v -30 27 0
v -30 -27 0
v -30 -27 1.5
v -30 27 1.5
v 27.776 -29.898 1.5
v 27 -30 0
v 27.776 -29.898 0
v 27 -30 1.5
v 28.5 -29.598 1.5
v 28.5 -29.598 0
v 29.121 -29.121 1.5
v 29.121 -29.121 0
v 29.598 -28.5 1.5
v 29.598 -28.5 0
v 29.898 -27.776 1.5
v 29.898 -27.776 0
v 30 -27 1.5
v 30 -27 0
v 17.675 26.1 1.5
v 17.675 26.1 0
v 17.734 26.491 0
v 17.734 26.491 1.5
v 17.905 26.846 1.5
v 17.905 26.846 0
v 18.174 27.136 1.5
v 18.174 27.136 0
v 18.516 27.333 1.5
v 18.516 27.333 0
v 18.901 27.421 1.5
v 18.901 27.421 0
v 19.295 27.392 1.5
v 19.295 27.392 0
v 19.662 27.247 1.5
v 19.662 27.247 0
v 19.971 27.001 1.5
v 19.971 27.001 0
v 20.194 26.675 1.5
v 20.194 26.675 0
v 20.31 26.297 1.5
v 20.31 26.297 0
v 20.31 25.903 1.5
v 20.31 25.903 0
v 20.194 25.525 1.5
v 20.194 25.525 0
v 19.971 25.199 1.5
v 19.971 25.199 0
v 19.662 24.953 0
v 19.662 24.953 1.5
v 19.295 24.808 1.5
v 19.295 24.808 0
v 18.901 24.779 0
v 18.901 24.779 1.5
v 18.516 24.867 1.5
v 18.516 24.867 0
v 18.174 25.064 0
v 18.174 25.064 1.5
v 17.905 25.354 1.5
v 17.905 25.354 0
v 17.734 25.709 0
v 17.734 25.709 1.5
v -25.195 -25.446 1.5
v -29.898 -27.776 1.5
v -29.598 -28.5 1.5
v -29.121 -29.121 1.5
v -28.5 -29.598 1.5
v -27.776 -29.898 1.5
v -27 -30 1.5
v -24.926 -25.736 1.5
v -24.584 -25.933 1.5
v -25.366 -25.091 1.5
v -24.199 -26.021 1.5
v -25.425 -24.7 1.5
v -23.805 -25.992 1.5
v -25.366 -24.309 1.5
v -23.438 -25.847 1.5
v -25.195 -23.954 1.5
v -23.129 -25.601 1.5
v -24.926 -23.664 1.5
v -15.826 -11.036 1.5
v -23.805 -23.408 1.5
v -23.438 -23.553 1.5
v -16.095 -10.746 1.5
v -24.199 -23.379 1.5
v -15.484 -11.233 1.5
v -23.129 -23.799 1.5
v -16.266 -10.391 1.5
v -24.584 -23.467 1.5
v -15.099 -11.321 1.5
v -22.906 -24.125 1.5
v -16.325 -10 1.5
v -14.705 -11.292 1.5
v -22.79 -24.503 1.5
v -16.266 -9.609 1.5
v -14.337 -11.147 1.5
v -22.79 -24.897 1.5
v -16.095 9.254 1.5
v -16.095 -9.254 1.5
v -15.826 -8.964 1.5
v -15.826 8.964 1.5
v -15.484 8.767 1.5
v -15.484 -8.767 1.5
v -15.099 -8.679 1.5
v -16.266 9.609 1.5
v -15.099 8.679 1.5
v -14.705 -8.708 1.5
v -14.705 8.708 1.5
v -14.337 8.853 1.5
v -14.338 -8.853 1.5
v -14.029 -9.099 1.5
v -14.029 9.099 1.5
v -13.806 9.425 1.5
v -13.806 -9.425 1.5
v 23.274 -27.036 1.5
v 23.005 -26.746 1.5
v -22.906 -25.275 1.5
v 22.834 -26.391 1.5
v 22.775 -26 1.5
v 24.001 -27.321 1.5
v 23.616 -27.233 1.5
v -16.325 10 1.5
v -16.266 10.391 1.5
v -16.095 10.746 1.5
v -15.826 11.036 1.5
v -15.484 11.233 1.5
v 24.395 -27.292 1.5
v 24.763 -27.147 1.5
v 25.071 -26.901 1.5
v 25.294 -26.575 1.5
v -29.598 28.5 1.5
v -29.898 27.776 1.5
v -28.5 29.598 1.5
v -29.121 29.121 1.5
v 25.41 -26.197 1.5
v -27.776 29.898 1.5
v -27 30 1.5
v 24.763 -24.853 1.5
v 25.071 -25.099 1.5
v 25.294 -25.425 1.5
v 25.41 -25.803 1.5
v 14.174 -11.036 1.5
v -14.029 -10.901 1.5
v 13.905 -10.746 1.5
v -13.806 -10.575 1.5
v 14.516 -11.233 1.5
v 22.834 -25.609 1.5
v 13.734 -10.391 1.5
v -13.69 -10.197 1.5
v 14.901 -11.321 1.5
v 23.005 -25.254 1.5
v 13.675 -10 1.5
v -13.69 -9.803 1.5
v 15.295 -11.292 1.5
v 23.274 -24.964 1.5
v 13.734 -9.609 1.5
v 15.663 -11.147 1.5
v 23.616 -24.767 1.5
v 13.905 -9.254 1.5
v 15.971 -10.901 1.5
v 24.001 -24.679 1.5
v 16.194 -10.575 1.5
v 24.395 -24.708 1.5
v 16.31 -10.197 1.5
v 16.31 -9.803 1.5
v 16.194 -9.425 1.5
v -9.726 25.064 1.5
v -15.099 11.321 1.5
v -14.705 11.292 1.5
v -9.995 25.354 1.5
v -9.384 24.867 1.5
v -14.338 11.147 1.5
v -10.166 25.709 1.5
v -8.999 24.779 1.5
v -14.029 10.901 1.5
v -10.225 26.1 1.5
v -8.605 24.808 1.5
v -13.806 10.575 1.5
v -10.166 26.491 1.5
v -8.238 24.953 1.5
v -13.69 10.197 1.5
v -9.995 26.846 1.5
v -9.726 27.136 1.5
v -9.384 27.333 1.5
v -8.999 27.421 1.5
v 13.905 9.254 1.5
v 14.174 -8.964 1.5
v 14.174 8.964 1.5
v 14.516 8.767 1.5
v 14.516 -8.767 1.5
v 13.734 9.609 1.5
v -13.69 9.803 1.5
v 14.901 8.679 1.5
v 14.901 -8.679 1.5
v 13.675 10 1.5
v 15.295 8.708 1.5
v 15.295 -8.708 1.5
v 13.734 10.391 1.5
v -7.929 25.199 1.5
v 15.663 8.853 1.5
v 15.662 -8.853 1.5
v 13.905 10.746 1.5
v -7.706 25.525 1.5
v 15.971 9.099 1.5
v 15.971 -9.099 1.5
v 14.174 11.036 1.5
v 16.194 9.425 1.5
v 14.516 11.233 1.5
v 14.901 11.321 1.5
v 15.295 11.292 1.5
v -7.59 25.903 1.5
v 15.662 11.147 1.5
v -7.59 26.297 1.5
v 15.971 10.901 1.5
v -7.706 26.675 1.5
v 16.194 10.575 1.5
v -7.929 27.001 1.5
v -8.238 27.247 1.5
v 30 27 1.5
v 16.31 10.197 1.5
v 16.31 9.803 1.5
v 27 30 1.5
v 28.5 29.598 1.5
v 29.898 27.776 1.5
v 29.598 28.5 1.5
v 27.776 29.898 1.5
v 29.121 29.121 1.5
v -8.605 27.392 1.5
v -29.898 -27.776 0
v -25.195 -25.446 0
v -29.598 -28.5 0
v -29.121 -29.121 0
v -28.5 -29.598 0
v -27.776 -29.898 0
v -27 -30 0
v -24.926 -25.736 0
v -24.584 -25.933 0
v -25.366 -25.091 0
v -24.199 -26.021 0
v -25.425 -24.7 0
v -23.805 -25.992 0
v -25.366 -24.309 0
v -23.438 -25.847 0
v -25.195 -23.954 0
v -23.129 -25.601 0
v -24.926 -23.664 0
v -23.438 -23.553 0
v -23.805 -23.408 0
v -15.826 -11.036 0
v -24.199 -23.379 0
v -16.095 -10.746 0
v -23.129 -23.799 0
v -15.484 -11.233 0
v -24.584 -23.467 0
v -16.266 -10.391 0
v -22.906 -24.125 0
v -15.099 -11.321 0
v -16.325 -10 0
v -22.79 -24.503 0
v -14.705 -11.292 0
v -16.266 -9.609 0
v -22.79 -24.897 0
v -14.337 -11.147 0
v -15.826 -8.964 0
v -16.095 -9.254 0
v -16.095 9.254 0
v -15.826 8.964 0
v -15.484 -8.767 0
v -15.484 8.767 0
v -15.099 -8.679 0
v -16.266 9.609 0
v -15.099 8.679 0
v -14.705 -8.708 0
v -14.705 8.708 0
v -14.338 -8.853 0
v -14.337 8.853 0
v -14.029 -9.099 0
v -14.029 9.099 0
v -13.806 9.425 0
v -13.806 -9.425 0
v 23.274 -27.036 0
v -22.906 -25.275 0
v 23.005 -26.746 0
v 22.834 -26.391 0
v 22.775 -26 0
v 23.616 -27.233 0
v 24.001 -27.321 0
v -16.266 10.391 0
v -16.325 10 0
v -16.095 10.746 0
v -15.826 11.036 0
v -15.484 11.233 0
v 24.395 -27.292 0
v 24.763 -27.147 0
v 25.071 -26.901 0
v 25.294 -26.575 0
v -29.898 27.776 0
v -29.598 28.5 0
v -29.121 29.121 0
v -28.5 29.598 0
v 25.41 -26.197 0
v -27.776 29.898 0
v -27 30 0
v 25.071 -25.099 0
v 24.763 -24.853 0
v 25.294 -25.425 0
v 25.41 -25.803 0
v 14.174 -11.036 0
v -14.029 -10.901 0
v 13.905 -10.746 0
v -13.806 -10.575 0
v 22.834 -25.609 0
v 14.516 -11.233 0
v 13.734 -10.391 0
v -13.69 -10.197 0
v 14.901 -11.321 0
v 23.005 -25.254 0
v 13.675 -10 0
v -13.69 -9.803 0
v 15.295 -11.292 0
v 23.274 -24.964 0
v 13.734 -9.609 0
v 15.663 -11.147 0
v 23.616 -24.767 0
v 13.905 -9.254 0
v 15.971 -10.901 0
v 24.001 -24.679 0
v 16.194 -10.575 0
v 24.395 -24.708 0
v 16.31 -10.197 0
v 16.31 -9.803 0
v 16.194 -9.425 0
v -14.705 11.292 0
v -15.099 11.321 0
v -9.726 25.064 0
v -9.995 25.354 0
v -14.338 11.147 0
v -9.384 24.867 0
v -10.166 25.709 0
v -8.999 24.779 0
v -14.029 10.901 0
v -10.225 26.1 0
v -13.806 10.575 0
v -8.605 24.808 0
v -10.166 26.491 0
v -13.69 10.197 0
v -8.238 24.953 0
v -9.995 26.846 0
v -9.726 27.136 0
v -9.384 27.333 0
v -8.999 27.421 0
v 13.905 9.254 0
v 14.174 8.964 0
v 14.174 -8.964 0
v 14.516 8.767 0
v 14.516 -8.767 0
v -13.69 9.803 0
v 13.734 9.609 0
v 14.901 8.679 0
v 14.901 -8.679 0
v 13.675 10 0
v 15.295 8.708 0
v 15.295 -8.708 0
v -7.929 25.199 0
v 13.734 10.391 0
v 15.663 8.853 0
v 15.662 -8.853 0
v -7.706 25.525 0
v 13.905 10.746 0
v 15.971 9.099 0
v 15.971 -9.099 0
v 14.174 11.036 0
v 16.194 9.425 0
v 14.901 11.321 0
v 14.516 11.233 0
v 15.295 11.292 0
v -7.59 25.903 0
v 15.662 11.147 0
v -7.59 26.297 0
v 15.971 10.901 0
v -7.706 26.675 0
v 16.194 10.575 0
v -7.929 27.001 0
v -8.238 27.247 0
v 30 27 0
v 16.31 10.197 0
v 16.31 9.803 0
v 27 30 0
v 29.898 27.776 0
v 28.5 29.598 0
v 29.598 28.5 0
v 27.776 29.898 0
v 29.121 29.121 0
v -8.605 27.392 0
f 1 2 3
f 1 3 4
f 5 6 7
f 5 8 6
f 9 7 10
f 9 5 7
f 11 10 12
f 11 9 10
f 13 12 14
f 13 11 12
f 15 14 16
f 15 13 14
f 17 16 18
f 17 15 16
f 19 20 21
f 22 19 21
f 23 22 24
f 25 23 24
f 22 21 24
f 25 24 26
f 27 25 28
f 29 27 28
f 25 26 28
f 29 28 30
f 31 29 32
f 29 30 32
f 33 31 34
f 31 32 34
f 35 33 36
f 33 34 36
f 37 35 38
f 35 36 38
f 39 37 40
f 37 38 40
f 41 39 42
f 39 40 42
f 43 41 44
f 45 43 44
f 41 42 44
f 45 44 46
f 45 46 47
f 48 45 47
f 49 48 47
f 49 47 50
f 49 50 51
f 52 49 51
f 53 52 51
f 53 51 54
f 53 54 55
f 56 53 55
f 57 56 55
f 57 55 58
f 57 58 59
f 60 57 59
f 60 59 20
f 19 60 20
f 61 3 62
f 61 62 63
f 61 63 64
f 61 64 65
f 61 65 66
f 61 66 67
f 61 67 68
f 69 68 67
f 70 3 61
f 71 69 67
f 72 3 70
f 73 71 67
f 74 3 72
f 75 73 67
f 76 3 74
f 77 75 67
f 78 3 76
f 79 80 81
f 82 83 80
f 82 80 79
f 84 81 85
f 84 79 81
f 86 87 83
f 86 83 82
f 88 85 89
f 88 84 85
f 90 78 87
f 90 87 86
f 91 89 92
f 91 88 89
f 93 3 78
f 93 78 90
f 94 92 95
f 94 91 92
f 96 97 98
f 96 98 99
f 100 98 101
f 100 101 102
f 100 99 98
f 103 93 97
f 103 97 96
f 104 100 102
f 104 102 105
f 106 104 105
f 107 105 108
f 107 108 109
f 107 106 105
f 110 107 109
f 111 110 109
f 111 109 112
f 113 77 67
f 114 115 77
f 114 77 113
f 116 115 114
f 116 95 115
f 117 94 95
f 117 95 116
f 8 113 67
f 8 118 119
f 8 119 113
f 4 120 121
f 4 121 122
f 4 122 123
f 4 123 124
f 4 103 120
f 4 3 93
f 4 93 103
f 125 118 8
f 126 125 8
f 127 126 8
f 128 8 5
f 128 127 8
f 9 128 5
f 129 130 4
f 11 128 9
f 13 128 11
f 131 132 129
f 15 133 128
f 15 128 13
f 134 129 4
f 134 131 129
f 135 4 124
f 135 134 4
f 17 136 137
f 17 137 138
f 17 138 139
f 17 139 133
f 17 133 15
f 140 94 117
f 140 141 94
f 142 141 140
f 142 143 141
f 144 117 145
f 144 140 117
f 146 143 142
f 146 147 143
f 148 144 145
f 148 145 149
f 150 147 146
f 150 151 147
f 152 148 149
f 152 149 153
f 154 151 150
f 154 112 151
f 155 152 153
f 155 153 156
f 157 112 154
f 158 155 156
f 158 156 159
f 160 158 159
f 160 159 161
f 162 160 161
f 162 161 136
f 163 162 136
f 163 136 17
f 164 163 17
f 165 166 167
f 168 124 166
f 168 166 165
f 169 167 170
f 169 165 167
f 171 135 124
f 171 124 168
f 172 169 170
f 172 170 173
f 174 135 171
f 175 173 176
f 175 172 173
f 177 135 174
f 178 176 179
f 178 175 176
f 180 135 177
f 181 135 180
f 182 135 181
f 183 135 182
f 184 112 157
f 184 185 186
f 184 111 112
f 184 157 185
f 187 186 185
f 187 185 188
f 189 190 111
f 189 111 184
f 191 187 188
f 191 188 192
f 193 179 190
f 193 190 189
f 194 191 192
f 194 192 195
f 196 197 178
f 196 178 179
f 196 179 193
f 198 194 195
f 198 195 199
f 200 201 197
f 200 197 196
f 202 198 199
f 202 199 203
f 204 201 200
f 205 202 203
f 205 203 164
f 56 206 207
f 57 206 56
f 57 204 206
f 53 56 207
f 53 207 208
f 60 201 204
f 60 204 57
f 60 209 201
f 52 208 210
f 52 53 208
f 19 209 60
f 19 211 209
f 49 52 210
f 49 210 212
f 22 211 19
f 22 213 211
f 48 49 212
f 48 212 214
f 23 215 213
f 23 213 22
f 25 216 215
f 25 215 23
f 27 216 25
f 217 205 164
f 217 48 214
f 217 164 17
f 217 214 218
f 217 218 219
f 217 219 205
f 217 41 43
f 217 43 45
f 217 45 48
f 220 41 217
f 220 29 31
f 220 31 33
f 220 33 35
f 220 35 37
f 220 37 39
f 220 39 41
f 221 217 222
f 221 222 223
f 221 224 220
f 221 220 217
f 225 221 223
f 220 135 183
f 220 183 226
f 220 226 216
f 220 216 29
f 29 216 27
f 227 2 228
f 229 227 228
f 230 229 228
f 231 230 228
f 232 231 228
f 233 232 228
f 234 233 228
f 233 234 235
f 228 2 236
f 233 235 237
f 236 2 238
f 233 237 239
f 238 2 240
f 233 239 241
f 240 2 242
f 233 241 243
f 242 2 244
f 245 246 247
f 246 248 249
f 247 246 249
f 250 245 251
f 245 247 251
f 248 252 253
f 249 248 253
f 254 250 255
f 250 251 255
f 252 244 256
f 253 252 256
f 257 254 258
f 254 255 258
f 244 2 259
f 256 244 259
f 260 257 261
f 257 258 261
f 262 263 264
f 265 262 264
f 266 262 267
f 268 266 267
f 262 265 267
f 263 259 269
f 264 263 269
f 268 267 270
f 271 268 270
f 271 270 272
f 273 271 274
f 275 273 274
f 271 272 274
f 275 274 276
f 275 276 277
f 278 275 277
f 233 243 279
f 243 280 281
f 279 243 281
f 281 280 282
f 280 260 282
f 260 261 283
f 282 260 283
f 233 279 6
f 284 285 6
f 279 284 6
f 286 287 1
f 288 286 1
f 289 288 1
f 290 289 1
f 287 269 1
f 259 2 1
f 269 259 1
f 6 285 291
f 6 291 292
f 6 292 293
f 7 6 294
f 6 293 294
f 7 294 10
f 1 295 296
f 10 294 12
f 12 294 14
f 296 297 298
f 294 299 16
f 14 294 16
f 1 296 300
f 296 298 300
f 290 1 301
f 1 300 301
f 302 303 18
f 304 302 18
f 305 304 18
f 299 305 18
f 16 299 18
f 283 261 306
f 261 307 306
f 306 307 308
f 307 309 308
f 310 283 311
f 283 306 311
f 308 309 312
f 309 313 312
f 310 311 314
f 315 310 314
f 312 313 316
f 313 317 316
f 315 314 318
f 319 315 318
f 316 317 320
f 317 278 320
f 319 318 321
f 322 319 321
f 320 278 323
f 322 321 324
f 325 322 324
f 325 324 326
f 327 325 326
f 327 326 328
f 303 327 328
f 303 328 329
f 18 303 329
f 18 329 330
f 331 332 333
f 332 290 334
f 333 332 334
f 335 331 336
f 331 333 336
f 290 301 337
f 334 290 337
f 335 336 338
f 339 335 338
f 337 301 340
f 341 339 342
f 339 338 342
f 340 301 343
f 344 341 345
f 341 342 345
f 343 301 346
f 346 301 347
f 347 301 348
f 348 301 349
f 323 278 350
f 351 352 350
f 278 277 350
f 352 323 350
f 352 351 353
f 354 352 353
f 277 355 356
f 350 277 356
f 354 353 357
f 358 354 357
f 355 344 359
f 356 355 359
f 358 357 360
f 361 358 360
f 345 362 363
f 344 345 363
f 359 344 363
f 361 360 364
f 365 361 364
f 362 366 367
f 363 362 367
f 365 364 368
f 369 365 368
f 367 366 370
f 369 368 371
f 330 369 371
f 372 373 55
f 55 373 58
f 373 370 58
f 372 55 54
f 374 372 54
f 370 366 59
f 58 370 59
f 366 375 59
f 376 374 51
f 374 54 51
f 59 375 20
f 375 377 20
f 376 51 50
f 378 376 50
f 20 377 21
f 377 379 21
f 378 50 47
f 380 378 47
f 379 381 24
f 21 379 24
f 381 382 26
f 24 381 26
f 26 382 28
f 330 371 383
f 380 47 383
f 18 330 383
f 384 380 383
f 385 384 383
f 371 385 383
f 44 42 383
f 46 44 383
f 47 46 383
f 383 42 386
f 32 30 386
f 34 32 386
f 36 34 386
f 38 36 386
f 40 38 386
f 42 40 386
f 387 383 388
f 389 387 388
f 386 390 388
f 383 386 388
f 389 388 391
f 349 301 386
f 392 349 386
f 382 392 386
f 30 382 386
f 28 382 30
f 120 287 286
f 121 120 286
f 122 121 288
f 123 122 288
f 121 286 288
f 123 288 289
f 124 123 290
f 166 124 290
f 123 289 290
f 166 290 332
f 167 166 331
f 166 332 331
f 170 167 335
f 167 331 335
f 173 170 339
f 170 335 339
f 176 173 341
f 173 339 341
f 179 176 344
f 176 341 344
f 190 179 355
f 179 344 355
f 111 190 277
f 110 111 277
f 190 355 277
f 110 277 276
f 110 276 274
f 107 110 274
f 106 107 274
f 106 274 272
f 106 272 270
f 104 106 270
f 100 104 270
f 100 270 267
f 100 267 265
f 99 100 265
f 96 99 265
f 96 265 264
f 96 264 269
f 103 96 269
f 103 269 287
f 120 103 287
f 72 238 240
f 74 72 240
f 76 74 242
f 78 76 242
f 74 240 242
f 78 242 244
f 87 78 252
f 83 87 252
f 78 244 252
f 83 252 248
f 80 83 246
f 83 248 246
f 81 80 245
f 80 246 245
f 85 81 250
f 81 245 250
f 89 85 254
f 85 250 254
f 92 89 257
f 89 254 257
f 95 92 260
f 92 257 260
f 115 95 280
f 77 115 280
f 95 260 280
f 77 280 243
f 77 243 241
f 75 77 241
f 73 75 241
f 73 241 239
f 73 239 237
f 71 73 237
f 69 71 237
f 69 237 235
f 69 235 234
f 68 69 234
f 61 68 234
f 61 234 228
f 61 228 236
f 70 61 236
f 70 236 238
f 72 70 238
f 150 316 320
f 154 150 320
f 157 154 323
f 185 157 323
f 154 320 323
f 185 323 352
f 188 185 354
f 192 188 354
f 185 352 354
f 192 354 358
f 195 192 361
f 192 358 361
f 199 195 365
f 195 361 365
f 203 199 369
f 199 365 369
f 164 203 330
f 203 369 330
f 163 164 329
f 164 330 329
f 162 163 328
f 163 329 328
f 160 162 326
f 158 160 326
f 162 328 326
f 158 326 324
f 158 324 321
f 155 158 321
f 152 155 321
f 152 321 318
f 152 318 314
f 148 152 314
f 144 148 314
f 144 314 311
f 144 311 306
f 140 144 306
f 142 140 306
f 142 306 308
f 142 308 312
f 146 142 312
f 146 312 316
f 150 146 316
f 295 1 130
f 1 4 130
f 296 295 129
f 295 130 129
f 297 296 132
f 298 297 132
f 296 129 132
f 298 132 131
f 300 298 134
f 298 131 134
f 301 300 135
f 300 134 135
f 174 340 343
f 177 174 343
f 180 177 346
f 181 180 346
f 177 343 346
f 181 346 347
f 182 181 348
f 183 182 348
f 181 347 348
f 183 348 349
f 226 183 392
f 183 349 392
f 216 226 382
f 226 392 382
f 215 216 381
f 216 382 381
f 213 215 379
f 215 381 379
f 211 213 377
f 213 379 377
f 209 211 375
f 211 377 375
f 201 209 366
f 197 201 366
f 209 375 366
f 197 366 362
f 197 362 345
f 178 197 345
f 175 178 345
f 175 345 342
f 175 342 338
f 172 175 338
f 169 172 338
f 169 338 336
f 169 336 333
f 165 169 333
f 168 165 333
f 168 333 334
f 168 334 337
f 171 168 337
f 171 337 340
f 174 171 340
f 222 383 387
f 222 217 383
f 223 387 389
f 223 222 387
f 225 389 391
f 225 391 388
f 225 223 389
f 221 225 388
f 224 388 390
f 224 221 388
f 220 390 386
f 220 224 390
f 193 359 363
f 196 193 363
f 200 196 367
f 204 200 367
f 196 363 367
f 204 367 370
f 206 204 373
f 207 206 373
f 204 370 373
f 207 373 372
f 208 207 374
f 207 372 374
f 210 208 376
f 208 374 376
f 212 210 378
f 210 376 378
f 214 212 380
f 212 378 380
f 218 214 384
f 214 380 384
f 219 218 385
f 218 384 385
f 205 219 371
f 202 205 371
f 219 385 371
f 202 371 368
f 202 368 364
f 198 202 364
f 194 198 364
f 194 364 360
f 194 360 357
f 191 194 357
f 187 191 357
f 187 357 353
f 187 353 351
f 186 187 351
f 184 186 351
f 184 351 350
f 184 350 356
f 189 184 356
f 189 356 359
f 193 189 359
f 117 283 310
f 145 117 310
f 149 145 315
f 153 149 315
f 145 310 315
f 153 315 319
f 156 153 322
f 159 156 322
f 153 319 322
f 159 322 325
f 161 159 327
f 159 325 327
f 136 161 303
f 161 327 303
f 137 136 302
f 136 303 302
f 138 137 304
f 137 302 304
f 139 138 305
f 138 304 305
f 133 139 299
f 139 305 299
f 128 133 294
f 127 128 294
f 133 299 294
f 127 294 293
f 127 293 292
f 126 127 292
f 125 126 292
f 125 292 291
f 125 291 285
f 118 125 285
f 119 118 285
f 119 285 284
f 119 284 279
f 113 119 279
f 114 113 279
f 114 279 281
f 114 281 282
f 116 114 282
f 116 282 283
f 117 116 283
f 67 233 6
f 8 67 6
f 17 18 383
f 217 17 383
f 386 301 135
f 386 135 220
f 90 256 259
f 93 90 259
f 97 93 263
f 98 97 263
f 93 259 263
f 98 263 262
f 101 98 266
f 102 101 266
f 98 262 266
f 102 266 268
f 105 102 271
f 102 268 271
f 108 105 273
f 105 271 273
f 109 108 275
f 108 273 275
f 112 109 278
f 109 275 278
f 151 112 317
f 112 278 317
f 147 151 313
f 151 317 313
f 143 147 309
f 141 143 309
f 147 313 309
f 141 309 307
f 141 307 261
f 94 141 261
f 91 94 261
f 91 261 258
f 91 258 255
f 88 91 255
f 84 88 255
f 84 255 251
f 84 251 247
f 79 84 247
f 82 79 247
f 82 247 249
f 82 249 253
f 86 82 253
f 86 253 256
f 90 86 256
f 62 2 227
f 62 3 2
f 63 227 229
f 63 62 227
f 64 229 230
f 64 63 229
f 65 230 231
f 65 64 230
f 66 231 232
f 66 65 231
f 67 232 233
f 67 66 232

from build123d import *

# Parameters (mm, degrees)
F0_W     = 60
F0_H     = 60
F1_DEPTH = 1.5
F2_R     = 3
F4_D     = 2.65


with BuildPart() as f1:
    # F0 (on Top) → F1 (new body)
    with BuildSketch(Plane.XY):
        Rectangle(F0_W, F0_H)
    extrude(amount=F1_DEPTH)

    # F2
    f2_edges = [f1.edges().sort_by_distance(p)[0] for p in [
        (-30, -30, 0.75),
        (30, -30, 0.75),
        (30, 30, 0.75),
        (-30, 30, 0.75),
    ]]
    fillet(f2_edges, radius=F2_R)

    # F4 (through all)
    with Locations(Plane.XY.offset(1.5)):
        with Locations((-15, 10), (15, 10), (15, -10), (-15, -10), (-8.9, 26.1), (19, 26.1), (24.1, -26), (-24.1, -24.7)):
            Hole(F4_D / 2)


solid = f1.part
